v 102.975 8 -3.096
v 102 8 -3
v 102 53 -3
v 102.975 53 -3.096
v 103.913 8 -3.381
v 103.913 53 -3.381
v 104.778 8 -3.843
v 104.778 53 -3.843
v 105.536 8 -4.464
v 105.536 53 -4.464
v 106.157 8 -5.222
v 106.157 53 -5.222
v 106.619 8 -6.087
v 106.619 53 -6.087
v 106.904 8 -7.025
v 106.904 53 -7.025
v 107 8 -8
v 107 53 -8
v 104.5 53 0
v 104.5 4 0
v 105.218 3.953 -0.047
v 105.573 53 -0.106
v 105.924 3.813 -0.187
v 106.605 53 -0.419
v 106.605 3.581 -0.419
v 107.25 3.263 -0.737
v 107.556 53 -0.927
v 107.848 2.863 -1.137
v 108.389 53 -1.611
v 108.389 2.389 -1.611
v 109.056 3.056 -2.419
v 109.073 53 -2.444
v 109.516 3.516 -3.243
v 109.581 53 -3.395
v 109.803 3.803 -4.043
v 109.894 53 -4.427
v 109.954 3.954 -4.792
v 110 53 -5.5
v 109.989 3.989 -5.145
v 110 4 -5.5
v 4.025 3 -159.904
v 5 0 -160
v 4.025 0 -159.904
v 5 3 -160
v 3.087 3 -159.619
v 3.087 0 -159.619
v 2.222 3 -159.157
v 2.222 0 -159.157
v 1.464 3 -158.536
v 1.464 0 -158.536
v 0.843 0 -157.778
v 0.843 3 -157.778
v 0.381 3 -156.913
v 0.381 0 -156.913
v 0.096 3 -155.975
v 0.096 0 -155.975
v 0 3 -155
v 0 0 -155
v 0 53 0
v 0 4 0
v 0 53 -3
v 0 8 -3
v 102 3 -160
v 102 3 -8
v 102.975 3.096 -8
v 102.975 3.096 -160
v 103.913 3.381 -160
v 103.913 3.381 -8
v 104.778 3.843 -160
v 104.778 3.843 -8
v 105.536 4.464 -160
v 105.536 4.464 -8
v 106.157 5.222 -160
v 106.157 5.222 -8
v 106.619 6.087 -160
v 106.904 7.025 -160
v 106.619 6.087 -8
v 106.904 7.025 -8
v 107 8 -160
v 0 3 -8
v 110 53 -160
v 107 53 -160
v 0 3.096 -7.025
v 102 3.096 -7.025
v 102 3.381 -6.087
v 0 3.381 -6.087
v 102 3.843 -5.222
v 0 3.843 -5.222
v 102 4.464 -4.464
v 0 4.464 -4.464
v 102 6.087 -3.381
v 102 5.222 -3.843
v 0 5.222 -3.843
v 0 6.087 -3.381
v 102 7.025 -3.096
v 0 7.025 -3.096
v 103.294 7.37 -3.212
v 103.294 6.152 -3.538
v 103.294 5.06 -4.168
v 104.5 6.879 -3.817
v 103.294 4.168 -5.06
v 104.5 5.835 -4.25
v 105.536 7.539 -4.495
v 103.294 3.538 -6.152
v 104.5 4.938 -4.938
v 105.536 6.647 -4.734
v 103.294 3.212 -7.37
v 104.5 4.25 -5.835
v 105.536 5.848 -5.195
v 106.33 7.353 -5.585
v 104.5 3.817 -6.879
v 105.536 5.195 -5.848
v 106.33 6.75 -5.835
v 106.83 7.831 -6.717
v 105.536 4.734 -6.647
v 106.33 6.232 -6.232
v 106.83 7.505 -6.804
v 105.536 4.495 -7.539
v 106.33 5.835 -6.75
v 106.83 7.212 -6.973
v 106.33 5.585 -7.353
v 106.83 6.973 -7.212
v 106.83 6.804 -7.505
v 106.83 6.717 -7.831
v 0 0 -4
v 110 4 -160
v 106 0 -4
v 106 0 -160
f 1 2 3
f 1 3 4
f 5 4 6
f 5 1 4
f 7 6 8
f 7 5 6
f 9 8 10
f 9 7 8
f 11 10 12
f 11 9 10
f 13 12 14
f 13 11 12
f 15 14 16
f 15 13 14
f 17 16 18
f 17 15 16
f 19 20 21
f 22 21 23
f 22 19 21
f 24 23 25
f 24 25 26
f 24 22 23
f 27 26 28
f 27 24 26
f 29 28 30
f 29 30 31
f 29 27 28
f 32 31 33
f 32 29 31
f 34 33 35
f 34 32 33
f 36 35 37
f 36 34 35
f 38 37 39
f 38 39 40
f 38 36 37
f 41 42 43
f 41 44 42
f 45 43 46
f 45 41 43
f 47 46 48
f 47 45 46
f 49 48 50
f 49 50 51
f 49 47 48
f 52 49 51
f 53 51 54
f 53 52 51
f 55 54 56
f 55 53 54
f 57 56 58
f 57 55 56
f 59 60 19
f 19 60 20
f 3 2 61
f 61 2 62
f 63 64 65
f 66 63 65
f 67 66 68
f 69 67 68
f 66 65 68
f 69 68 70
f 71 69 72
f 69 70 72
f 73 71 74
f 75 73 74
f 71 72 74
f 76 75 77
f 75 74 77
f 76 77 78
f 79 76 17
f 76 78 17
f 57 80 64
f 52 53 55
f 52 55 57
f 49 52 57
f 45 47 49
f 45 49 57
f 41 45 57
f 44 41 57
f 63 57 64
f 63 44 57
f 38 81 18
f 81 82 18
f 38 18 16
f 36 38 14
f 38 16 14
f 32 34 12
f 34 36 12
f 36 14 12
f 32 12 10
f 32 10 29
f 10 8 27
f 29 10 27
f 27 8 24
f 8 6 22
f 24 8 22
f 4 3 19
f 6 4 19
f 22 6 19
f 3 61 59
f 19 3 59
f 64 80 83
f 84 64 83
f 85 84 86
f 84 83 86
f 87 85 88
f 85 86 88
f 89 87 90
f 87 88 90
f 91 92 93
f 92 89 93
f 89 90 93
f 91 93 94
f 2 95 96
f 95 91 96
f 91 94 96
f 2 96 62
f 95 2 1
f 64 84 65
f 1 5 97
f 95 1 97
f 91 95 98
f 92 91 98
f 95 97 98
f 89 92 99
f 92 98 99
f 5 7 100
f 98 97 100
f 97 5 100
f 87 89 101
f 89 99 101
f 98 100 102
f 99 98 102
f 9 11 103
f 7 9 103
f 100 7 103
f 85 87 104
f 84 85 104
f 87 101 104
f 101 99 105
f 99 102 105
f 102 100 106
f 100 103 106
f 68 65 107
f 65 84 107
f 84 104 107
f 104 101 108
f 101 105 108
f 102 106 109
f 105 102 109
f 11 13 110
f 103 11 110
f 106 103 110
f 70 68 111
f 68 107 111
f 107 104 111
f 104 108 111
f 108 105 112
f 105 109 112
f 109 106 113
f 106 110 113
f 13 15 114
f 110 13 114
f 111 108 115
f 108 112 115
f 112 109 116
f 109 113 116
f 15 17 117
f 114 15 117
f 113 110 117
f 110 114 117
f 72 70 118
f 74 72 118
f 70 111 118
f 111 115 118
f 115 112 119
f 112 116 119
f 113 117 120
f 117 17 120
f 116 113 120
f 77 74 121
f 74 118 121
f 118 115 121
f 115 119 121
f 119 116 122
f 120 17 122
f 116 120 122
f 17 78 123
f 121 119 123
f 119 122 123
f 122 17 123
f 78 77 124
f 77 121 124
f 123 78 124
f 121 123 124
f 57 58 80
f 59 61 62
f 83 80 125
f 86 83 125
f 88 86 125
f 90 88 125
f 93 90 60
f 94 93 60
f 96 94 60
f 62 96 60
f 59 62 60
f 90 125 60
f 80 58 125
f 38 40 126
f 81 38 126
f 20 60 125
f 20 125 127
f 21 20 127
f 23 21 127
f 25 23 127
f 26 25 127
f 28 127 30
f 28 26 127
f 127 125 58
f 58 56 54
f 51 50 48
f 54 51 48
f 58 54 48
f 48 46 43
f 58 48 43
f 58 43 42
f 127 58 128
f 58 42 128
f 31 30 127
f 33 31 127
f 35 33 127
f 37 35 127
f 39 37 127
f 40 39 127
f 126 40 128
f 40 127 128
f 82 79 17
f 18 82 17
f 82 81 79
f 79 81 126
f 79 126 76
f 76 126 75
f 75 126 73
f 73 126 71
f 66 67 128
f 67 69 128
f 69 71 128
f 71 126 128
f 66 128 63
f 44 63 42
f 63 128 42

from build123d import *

# Parameters (mm, degrees)
SKETCH_1_W      = 110
SKETCH_1_H      = 160
EXTRUDE_1_DEPTH = 3
EXTRUDE_2_DEPTH = 50
FILLET_1_R      = 5
CHAMFER_1_SIZE  = 4
FILLET_2_R      = 5
FILLET_3_R      = 5
FILLET_4_R      = 5.5


with BuildPart() as part:
    # 草图1 → 凸台-拉伸1 (new body)
    with BuildSketch(Plane(origin=(0, 0, 0), x_dir=(1, 0, 0), z_dir=(0, 1, 0))):
        with Locations((55, 80)):
            Rectangle(SKETCH_1_W, SKETCH_1_H)
    extrude(amount=EXTRUDE_1_DEPTH)

    # 草图2 → 凸台-拉伸2 (add)
    with BuildSketch(Plane(origin=(0, 3, 0), x_dir=(1, 0, 0), z_dir=(0, 1, 0))):
        Polygon((0, 0), (110, 0), (110, 3), (110, 160), (107, 160), (107, 3), (0, 3), align=None)
    extrude(amount=EXTRUDE_2_DEPTH)

    # 圆角1
    fillet_1_edges = [part.edges().sort_by_distance(p)[0] for p in [
        (107, 3, -81.5),
        (53.5, 3, -3),
    ]]
    fillet(fillet_1_edges, radius=FILLET_1_R)

    # 倒角1
    chamfer_1_edges = [part.edges().sort_by_distance(p)[0] for p in [
        (110, 0, -80),
        (55, 0, 0),
    ]]
    chamfer(chamfer_1_edges, length=CHAMFER_1_SIZE)

    # 圆角2
    fillet_2_edges = [part.edges().sort_by_distance(p)[0] for p in [
        (0, 1.5, -160),
    ]]
    fillet(fillet_2_edges, radius=FILLET_2_R)

    # 圆角3
    # the kernel refuses this fillet: 5 mm, written as the material it adds along each edge
    with BuildSketch(Plane(origin=(102, 8, -8), x_dir=(0, 0, 1), z_dir=(1, 0, 0))) as fillet_3_piece_1_section:
        Polygon((0, 0), (FILLET_3_R, 0), (FILLET_3_R, FILLET_3_R), (0, FILLET_3_R), align=None)
    fillet_3_piece_1 = extrude(amount=FILLET_3_R, mode=Mode.PRIVATE)
    fillet_3_piece_1 = fillet_3_piece_1 - Plane(origin=(102, 8, -8), x_dir=(0, 0.7071067811865475, -0.7071067811865475), z_dir=(1, 0, 0)) * Sphere(FILLET_3_R, mode=Mode.PRIVATE)
    add(fillet_3_piece_1)
    with BuildSketch(Plane(origin=(107, 8, -3), x_dir=(0, 0, -1), z_dir=(0, 1, 0))) as fillet_3_piece_2:
        with BuildLine():
            CenterArc((FILLET_3_R, FILLET_3_R), FILLET_3_R, 180, 90)
            Line((0, FILLET_3_R), (0, 0))
            Line((0, 0), (FILLET_3_R, 0))
        make_face()
    extrude(amount=45)

    # 圆角4
    fillet_4_edges = [part.edges().sort_by_distance(p)[0] for p in [
        (110, 28.5, 0),
    ]]
    fillet(fillet_4_edges, radius=FILLET_4_R)


solid = part.part
